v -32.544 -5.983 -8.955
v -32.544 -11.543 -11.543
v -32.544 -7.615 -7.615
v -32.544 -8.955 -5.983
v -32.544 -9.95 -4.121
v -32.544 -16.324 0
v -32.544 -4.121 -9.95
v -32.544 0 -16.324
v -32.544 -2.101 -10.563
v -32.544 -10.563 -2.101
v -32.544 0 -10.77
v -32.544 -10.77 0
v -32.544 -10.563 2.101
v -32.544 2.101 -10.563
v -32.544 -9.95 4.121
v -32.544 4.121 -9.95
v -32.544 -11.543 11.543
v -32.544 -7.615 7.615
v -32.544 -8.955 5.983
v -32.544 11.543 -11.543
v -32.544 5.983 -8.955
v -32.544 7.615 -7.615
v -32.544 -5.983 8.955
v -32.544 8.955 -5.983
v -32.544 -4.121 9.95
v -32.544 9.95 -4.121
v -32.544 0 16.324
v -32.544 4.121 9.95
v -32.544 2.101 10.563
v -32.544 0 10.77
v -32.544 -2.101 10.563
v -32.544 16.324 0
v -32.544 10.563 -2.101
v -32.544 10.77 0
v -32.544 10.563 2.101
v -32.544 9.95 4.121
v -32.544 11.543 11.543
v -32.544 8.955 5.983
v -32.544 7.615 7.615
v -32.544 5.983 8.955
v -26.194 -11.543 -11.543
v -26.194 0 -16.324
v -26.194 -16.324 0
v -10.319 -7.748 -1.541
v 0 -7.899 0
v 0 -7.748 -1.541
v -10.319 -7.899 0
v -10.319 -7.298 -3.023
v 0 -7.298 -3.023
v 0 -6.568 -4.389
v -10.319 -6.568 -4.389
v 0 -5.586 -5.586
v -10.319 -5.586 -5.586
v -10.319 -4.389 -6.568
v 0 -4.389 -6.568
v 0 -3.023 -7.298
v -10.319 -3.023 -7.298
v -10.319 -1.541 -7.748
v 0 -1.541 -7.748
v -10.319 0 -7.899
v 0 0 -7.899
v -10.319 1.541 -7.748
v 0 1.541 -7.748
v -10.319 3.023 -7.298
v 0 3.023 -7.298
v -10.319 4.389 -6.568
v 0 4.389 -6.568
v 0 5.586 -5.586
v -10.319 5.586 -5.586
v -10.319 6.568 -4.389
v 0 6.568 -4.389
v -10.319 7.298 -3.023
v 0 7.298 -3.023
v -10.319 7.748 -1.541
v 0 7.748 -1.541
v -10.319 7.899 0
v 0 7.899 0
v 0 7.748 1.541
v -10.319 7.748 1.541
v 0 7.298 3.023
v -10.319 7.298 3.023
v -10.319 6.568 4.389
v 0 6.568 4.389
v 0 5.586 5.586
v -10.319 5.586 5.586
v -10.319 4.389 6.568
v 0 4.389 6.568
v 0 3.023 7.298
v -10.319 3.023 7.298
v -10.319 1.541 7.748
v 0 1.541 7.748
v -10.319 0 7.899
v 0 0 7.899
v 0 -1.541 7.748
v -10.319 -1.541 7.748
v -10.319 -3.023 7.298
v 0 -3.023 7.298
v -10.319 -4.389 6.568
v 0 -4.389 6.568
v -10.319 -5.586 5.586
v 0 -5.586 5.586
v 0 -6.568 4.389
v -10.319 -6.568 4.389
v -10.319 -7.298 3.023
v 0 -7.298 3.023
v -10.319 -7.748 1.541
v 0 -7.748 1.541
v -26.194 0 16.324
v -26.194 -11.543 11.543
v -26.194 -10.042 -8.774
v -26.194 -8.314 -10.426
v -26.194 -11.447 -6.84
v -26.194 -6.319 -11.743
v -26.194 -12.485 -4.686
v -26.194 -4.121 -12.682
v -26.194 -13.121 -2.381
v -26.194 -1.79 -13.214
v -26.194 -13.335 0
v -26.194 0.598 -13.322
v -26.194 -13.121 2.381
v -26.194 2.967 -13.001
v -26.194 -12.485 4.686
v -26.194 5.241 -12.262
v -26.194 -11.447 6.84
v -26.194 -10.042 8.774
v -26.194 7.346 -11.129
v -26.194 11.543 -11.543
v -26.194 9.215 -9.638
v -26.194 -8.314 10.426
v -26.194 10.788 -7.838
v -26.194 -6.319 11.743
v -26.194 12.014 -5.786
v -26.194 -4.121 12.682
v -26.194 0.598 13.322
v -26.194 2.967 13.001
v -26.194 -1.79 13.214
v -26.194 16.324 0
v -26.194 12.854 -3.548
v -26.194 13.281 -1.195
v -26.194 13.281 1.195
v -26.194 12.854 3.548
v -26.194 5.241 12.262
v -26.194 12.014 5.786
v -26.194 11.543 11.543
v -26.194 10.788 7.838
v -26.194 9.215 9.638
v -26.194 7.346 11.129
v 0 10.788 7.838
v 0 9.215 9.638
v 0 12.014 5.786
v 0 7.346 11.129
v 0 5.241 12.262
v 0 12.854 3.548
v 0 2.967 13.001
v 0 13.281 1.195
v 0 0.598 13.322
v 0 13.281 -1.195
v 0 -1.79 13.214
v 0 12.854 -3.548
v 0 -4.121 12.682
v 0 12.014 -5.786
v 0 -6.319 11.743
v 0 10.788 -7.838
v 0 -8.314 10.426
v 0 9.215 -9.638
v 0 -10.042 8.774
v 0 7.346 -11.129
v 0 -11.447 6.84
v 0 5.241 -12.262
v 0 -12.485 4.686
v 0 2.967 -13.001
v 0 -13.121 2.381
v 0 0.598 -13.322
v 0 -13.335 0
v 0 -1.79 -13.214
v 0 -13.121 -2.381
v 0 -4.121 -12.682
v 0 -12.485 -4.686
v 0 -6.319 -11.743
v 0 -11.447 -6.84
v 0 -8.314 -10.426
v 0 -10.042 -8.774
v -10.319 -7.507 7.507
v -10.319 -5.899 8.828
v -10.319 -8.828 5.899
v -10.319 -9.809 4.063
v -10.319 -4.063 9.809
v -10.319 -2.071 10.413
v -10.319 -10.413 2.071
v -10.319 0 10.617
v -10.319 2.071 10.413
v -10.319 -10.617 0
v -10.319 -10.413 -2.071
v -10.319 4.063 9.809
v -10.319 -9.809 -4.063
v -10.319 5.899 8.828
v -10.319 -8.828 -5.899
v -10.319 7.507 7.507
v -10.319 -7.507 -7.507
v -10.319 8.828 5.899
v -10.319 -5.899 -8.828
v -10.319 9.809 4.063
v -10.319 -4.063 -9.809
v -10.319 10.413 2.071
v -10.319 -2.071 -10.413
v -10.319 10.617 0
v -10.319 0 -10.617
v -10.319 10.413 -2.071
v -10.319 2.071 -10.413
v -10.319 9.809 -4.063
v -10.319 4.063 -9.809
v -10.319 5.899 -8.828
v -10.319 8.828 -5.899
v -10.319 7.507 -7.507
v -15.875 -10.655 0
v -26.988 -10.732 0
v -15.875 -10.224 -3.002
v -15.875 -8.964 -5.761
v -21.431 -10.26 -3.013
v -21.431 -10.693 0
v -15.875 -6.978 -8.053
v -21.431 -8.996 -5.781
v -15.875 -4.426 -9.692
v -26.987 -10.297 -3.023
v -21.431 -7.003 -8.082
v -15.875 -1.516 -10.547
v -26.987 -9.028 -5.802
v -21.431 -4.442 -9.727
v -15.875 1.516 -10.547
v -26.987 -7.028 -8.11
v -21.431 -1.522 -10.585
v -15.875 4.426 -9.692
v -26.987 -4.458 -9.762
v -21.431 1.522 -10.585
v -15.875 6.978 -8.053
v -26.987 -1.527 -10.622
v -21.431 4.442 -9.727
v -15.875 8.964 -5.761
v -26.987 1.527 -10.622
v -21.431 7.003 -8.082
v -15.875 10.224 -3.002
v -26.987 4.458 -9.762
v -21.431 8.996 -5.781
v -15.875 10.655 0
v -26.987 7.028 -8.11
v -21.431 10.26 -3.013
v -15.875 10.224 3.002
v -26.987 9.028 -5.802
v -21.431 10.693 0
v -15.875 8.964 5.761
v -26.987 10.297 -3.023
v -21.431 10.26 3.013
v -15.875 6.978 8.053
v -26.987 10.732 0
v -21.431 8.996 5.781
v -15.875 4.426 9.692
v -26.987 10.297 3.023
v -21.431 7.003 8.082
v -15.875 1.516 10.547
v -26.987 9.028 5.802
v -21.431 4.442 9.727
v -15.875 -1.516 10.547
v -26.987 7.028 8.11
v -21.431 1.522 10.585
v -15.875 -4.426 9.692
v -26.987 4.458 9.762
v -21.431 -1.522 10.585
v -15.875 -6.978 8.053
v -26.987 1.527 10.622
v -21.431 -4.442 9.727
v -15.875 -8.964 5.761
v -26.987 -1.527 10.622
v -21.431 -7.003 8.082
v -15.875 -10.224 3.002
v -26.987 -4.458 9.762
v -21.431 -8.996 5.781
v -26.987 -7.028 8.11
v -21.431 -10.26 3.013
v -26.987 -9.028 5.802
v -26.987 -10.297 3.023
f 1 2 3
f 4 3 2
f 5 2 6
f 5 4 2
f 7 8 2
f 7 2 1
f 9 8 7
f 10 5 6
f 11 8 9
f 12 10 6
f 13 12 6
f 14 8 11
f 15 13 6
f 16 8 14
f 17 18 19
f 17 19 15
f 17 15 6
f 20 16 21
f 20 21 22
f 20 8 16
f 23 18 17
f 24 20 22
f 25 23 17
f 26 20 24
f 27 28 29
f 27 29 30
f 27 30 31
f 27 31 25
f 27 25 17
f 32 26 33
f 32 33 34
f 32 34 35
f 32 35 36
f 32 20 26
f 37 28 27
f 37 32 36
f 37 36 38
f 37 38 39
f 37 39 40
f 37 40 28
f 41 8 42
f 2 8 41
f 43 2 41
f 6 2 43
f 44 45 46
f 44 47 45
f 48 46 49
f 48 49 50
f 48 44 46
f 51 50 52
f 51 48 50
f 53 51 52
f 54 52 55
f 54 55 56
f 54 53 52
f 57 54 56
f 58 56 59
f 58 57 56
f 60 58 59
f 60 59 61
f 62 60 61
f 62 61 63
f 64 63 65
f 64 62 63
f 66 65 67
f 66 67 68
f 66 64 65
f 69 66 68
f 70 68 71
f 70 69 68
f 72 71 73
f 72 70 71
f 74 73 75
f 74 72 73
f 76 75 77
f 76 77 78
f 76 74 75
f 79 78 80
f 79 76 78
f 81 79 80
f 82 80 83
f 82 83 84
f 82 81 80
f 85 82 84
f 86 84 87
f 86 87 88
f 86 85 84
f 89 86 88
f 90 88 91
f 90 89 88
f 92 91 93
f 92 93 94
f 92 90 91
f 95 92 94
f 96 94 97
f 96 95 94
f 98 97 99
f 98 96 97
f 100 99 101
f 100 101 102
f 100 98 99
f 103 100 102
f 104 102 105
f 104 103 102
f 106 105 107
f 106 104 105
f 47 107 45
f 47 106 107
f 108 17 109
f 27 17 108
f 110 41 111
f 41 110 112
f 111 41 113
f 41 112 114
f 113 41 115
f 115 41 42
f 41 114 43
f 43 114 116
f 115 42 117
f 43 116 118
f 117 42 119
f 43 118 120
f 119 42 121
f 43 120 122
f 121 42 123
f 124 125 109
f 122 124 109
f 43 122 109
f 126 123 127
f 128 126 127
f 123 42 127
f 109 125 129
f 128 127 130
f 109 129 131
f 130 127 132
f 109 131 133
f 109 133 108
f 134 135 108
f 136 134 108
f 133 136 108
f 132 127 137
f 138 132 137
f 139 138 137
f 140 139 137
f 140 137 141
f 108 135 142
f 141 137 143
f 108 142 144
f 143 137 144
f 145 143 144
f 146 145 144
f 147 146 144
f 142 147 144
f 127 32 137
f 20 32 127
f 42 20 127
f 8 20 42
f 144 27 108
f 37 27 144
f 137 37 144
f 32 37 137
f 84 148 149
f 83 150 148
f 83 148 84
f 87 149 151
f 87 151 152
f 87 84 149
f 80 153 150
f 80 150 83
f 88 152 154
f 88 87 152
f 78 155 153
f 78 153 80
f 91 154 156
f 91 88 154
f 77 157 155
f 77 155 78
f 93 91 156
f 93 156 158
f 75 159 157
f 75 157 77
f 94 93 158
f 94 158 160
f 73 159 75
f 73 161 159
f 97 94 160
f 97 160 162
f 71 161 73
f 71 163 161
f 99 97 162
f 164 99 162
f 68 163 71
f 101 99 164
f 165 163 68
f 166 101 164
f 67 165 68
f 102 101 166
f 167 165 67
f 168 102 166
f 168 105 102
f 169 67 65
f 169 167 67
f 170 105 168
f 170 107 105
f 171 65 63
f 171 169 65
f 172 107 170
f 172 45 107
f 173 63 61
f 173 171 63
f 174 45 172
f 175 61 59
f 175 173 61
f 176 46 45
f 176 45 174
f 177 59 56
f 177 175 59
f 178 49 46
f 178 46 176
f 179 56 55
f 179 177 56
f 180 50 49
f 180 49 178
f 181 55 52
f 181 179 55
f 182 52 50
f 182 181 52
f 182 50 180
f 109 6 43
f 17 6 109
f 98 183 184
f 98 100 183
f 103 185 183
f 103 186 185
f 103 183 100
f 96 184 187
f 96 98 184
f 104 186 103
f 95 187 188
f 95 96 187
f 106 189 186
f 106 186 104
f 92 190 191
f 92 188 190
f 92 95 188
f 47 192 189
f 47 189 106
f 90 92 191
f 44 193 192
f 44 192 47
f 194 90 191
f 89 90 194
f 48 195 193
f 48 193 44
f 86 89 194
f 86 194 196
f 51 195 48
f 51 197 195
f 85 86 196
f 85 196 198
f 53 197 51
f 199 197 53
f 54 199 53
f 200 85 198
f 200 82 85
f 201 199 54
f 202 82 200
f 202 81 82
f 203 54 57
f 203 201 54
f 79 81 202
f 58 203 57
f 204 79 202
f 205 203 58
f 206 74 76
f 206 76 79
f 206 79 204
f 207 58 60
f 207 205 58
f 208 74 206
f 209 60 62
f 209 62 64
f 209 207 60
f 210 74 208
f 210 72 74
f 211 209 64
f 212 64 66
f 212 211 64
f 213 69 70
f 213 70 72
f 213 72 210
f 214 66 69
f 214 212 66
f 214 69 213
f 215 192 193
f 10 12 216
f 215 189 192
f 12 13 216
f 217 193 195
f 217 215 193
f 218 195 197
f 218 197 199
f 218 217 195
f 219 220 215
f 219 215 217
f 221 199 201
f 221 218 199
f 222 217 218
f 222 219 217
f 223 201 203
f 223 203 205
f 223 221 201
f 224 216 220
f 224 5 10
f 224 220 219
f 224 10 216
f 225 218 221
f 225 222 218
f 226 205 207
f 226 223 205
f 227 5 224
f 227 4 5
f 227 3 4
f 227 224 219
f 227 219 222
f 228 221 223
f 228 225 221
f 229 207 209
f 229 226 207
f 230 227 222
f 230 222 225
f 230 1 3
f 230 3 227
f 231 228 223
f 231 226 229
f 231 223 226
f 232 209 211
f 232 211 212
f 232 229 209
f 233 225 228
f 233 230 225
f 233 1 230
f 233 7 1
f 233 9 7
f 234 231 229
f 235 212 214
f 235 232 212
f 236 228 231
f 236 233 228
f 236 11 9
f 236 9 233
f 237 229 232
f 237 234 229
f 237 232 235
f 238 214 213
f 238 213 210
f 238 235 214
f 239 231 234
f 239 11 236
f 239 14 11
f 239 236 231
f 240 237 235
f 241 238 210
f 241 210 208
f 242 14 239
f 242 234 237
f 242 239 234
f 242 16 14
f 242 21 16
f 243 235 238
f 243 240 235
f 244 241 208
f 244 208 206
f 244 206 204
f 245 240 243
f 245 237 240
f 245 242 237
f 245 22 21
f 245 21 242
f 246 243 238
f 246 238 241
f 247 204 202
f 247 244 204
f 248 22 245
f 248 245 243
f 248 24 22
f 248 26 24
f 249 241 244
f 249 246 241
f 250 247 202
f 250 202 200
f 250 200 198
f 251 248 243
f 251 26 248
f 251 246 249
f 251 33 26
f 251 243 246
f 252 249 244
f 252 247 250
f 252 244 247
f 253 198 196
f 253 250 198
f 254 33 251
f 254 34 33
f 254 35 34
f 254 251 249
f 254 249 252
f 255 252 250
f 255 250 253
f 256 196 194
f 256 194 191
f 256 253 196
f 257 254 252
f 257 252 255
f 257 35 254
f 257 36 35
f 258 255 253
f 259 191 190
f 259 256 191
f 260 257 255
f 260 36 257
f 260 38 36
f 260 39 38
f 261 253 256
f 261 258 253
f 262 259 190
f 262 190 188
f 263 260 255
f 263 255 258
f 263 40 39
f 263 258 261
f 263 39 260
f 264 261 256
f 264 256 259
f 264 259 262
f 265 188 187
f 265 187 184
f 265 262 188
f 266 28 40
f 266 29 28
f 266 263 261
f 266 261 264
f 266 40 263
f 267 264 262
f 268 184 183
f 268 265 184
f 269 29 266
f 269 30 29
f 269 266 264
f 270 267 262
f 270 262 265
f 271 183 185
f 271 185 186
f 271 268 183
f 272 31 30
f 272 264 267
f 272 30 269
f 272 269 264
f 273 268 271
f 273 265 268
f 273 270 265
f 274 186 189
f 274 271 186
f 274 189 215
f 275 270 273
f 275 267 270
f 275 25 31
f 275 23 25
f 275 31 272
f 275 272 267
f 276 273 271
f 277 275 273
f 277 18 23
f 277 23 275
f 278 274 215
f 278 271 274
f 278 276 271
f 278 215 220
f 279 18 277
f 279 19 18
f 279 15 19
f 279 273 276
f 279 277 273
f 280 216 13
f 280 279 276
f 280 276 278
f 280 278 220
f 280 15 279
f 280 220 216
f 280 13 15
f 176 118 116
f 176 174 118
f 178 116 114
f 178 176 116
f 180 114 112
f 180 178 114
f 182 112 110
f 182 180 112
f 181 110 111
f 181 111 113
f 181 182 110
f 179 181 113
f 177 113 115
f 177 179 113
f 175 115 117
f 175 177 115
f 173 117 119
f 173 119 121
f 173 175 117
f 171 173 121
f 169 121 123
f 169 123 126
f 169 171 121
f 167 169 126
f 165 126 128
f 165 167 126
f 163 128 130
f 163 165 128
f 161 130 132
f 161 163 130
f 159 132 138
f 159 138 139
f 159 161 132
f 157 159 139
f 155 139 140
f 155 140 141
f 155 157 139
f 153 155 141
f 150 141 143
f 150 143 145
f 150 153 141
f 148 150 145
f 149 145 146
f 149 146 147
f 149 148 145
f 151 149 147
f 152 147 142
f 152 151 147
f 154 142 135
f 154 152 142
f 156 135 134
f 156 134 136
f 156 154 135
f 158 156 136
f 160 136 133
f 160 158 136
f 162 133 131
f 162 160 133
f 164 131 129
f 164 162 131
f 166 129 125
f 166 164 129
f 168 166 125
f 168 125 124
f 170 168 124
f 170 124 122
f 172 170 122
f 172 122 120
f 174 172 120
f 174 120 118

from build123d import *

# Parameters (mm, degrees)
SKETCH2_R           = 10.7696
BOSS_EXTRUDE1_DEPTH = 6.35


with BuildPart() as part:
    # Sketch1 → Revolve1 (revolve)
    with BuildSketch(Plane.XY):
        Polygon((-32.54375, -13.335), (0, -13.335), (0, -7.8994), (-10.31875, -7.8994), (-10.31875, -10.6172), (-32.54375, -10.7696), align=None)
    revolve(axis=Axis((-32.54375, 0, 0), (1, 0, 0)))

    # Sketch2 → Boss-Extrude1 (add)
    with BuildSketch(Plane.ZY.offset(32.54375)):
        Polygon((16.323827371, 0), (11.542689029, 11.542689029), (0, 16.323827371), (-11.542689029, 11.542689029), (-16.323827371, 0), (-11.542689029, -11.542689029), (0, -16.323827371), (11.542689029, -11.542689029), align=None)
        Circle(SKETCH2_R, mode=Mode.SUBTRACT)
    extrude(amount=-BOSS_EXTRUDE1_DEPTH)


solid = part.part
